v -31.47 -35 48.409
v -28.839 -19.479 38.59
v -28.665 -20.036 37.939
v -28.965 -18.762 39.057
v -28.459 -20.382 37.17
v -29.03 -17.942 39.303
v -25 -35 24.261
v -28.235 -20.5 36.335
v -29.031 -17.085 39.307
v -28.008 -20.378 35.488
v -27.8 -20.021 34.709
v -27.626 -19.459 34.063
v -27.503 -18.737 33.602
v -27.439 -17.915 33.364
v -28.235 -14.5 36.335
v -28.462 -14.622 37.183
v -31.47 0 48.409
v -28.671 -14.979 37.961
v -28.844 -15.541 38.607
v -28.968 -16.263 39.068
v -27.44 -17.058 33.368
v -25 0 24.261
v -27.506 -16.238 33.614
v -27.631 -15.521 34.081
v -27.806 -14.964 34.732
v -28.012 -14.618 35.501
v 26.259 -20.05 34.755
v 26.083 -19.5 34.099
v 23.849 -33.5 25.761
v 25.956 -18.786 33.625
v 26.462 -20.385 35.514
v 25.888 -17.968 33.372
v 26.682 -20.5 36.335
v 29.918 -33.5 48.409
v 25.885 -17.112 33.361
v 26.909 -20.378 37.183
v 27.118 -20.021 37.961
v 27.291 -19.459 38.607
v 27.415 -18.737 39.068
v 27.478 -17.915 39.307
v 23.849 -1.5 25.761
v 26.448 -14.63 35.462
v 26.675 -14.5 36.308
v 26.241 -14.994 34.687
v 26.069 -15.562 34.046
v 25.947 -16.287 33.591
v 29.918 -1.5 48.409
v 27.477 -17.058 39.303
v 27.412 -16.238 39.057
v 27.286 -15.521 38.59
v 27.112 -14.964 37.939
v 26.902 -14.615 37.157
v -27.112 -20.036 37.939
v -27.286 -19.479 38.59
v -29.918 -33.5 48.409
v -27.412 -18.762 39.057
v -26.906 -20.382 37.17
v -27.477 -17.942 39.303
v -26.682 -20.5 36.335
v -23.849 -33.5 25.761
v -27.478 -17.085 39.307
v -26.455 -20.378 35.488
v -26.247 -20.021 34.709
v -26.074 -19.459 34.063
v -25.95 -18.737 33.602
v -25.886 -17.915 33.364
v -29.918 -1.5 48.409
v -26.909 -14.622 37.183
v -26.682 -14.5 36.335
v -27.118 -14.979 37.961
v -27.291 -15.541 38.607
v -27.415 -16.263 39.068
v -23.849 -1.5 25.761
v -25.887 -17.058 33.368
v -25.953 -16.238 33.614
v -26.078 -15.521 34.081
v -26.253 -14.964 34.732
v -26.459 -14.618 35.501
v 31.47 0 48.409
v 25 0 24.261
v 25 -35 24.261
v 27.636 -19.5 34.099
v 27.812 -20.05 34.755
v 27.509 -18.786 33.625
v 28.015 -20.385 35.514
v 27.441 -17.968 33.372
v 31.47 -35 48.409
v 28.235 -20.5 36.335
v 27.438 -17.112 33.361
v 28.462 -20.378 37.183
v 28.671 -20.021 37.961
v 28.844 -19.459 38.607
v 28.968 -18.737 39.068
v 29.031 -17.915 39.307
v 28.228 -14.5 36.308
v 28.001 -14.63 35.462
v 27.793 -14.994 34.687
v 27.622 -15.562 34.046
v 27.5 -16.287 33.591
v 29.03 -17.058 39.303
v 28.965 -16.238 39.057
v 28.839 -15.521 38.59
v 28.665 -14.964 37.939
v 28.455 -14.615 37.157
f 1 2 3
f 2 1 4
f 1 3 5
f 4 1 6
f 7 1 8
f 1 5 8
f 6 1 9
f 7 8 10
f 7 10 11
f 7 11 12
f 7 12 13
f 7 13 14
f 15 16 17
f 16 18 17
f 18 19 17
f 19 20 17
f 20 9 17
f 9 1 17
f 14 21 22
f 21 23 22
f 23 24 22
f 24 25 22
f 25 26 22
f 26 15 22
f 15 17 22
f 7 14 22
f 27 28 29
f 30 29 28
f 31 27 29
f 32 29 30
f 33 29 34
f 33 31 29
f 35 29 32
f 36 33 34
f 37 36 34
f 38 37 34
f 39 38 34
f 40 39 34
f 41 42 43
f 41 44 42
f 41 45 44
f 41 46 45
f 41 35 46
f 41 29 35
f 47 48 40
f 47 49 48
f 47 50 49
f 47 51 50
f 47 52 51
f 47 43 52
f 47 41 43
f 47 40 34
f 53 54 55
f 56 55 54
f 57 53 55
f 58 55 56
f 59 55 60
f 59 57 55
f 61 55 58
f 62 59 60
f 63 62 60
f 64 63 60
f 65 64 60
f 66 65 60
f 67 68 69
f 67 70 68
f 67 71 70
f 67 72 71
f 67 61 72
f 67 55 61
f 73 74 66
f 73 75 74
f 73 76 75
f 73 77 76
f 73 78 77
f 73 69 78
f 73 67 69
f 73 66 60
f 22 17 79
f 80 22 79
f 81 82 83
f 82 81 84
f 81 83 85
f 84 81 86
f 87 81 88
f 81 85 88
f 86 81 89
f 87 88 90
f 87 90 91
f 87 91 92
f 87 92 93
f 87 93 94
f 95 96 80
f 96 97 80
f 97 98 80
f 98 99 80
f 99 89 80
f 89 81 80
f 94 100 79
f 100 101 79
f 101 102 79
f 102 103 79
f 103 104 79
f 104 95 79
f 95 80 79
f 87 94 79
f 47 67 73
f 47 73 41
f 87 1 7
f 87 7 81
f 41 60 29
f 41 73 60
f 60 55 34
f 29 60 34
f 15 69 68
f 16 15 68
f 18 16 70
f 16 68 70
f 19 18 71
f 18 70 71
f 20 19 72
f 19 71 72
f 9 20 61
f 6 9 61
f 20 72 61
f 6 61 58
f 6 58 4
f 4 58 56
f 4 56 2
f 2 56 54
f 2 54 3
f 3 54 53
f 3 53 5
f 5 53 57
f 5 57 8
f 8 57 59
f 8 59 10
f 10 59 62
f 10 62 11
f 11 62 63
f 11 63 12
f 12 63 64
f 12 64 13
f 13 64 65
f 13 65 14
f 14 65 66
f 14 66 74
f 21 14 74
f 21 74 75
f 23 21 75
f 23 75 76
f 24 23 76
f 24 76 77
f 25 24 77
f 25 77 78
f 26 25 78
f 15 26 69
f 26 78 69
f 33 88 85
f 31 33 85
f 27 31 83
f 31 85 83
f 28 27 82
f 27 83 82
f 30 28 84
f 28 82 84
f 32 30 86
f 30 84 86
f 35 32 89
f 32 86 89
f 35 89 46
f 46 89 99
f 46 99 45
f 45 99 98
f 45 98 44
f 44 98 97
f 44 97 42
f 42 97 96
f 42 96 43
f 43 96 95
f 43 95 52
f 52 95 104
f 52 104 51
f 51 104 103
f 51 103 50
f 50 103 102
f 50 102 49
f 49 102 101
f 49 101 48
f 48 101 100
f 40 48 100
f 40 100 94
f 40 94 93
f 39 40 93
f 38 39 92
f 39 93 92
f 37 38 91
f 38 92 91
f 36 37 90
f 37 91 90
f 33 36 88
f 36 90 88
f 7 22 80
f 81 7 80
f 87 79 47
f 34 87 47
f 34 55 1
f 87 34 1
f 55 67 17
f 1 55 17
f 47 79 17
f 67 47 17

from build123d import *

# Parameters (mm, degrees)
F1_DEPTH = 35
F2_T     = -1.5
F4_D     = 6
F4_DEPTH = 31.4714761276
F5_D     = 6


with BuildPart() as f1:
    # F0 (on Front) → F1 (new body)
    with BuildSketch(Plane.XZ):
        Polygon((-31.4704761276, 48.409471255), (-25, 24.2613255978), (25, 24.2613255978), (31.4704761276, 48.409471255), align=None)
    extrude(amount=F1_DEPTH)

    # F2
    f2_openings = [f1.faces().sort_by_distance(p)[0] for p in [
        (0, -17.5, 48.409471),
    ]]
    offset(amount=F2_T, openings=f2_openings)

    # F4 (through all, one way)
    with BuildSketch(Plane.YZ):
        with Locations((-17.5, 36.3353984264)):
            Circle(F4_D / 2)
    extrude(amount=-F4_DEPTH, mode=Mode.SUBTRACT)

    # F5 (through all)
    with Locations(Plane(origin=(0, 0, 0), x_dir=(0, 1, 0), z_dir=(-1, 0, 0))):
        with Locations((-17.5, -36.3353984264)):
            Hole(F5_D / 2)


solid = f1.part
